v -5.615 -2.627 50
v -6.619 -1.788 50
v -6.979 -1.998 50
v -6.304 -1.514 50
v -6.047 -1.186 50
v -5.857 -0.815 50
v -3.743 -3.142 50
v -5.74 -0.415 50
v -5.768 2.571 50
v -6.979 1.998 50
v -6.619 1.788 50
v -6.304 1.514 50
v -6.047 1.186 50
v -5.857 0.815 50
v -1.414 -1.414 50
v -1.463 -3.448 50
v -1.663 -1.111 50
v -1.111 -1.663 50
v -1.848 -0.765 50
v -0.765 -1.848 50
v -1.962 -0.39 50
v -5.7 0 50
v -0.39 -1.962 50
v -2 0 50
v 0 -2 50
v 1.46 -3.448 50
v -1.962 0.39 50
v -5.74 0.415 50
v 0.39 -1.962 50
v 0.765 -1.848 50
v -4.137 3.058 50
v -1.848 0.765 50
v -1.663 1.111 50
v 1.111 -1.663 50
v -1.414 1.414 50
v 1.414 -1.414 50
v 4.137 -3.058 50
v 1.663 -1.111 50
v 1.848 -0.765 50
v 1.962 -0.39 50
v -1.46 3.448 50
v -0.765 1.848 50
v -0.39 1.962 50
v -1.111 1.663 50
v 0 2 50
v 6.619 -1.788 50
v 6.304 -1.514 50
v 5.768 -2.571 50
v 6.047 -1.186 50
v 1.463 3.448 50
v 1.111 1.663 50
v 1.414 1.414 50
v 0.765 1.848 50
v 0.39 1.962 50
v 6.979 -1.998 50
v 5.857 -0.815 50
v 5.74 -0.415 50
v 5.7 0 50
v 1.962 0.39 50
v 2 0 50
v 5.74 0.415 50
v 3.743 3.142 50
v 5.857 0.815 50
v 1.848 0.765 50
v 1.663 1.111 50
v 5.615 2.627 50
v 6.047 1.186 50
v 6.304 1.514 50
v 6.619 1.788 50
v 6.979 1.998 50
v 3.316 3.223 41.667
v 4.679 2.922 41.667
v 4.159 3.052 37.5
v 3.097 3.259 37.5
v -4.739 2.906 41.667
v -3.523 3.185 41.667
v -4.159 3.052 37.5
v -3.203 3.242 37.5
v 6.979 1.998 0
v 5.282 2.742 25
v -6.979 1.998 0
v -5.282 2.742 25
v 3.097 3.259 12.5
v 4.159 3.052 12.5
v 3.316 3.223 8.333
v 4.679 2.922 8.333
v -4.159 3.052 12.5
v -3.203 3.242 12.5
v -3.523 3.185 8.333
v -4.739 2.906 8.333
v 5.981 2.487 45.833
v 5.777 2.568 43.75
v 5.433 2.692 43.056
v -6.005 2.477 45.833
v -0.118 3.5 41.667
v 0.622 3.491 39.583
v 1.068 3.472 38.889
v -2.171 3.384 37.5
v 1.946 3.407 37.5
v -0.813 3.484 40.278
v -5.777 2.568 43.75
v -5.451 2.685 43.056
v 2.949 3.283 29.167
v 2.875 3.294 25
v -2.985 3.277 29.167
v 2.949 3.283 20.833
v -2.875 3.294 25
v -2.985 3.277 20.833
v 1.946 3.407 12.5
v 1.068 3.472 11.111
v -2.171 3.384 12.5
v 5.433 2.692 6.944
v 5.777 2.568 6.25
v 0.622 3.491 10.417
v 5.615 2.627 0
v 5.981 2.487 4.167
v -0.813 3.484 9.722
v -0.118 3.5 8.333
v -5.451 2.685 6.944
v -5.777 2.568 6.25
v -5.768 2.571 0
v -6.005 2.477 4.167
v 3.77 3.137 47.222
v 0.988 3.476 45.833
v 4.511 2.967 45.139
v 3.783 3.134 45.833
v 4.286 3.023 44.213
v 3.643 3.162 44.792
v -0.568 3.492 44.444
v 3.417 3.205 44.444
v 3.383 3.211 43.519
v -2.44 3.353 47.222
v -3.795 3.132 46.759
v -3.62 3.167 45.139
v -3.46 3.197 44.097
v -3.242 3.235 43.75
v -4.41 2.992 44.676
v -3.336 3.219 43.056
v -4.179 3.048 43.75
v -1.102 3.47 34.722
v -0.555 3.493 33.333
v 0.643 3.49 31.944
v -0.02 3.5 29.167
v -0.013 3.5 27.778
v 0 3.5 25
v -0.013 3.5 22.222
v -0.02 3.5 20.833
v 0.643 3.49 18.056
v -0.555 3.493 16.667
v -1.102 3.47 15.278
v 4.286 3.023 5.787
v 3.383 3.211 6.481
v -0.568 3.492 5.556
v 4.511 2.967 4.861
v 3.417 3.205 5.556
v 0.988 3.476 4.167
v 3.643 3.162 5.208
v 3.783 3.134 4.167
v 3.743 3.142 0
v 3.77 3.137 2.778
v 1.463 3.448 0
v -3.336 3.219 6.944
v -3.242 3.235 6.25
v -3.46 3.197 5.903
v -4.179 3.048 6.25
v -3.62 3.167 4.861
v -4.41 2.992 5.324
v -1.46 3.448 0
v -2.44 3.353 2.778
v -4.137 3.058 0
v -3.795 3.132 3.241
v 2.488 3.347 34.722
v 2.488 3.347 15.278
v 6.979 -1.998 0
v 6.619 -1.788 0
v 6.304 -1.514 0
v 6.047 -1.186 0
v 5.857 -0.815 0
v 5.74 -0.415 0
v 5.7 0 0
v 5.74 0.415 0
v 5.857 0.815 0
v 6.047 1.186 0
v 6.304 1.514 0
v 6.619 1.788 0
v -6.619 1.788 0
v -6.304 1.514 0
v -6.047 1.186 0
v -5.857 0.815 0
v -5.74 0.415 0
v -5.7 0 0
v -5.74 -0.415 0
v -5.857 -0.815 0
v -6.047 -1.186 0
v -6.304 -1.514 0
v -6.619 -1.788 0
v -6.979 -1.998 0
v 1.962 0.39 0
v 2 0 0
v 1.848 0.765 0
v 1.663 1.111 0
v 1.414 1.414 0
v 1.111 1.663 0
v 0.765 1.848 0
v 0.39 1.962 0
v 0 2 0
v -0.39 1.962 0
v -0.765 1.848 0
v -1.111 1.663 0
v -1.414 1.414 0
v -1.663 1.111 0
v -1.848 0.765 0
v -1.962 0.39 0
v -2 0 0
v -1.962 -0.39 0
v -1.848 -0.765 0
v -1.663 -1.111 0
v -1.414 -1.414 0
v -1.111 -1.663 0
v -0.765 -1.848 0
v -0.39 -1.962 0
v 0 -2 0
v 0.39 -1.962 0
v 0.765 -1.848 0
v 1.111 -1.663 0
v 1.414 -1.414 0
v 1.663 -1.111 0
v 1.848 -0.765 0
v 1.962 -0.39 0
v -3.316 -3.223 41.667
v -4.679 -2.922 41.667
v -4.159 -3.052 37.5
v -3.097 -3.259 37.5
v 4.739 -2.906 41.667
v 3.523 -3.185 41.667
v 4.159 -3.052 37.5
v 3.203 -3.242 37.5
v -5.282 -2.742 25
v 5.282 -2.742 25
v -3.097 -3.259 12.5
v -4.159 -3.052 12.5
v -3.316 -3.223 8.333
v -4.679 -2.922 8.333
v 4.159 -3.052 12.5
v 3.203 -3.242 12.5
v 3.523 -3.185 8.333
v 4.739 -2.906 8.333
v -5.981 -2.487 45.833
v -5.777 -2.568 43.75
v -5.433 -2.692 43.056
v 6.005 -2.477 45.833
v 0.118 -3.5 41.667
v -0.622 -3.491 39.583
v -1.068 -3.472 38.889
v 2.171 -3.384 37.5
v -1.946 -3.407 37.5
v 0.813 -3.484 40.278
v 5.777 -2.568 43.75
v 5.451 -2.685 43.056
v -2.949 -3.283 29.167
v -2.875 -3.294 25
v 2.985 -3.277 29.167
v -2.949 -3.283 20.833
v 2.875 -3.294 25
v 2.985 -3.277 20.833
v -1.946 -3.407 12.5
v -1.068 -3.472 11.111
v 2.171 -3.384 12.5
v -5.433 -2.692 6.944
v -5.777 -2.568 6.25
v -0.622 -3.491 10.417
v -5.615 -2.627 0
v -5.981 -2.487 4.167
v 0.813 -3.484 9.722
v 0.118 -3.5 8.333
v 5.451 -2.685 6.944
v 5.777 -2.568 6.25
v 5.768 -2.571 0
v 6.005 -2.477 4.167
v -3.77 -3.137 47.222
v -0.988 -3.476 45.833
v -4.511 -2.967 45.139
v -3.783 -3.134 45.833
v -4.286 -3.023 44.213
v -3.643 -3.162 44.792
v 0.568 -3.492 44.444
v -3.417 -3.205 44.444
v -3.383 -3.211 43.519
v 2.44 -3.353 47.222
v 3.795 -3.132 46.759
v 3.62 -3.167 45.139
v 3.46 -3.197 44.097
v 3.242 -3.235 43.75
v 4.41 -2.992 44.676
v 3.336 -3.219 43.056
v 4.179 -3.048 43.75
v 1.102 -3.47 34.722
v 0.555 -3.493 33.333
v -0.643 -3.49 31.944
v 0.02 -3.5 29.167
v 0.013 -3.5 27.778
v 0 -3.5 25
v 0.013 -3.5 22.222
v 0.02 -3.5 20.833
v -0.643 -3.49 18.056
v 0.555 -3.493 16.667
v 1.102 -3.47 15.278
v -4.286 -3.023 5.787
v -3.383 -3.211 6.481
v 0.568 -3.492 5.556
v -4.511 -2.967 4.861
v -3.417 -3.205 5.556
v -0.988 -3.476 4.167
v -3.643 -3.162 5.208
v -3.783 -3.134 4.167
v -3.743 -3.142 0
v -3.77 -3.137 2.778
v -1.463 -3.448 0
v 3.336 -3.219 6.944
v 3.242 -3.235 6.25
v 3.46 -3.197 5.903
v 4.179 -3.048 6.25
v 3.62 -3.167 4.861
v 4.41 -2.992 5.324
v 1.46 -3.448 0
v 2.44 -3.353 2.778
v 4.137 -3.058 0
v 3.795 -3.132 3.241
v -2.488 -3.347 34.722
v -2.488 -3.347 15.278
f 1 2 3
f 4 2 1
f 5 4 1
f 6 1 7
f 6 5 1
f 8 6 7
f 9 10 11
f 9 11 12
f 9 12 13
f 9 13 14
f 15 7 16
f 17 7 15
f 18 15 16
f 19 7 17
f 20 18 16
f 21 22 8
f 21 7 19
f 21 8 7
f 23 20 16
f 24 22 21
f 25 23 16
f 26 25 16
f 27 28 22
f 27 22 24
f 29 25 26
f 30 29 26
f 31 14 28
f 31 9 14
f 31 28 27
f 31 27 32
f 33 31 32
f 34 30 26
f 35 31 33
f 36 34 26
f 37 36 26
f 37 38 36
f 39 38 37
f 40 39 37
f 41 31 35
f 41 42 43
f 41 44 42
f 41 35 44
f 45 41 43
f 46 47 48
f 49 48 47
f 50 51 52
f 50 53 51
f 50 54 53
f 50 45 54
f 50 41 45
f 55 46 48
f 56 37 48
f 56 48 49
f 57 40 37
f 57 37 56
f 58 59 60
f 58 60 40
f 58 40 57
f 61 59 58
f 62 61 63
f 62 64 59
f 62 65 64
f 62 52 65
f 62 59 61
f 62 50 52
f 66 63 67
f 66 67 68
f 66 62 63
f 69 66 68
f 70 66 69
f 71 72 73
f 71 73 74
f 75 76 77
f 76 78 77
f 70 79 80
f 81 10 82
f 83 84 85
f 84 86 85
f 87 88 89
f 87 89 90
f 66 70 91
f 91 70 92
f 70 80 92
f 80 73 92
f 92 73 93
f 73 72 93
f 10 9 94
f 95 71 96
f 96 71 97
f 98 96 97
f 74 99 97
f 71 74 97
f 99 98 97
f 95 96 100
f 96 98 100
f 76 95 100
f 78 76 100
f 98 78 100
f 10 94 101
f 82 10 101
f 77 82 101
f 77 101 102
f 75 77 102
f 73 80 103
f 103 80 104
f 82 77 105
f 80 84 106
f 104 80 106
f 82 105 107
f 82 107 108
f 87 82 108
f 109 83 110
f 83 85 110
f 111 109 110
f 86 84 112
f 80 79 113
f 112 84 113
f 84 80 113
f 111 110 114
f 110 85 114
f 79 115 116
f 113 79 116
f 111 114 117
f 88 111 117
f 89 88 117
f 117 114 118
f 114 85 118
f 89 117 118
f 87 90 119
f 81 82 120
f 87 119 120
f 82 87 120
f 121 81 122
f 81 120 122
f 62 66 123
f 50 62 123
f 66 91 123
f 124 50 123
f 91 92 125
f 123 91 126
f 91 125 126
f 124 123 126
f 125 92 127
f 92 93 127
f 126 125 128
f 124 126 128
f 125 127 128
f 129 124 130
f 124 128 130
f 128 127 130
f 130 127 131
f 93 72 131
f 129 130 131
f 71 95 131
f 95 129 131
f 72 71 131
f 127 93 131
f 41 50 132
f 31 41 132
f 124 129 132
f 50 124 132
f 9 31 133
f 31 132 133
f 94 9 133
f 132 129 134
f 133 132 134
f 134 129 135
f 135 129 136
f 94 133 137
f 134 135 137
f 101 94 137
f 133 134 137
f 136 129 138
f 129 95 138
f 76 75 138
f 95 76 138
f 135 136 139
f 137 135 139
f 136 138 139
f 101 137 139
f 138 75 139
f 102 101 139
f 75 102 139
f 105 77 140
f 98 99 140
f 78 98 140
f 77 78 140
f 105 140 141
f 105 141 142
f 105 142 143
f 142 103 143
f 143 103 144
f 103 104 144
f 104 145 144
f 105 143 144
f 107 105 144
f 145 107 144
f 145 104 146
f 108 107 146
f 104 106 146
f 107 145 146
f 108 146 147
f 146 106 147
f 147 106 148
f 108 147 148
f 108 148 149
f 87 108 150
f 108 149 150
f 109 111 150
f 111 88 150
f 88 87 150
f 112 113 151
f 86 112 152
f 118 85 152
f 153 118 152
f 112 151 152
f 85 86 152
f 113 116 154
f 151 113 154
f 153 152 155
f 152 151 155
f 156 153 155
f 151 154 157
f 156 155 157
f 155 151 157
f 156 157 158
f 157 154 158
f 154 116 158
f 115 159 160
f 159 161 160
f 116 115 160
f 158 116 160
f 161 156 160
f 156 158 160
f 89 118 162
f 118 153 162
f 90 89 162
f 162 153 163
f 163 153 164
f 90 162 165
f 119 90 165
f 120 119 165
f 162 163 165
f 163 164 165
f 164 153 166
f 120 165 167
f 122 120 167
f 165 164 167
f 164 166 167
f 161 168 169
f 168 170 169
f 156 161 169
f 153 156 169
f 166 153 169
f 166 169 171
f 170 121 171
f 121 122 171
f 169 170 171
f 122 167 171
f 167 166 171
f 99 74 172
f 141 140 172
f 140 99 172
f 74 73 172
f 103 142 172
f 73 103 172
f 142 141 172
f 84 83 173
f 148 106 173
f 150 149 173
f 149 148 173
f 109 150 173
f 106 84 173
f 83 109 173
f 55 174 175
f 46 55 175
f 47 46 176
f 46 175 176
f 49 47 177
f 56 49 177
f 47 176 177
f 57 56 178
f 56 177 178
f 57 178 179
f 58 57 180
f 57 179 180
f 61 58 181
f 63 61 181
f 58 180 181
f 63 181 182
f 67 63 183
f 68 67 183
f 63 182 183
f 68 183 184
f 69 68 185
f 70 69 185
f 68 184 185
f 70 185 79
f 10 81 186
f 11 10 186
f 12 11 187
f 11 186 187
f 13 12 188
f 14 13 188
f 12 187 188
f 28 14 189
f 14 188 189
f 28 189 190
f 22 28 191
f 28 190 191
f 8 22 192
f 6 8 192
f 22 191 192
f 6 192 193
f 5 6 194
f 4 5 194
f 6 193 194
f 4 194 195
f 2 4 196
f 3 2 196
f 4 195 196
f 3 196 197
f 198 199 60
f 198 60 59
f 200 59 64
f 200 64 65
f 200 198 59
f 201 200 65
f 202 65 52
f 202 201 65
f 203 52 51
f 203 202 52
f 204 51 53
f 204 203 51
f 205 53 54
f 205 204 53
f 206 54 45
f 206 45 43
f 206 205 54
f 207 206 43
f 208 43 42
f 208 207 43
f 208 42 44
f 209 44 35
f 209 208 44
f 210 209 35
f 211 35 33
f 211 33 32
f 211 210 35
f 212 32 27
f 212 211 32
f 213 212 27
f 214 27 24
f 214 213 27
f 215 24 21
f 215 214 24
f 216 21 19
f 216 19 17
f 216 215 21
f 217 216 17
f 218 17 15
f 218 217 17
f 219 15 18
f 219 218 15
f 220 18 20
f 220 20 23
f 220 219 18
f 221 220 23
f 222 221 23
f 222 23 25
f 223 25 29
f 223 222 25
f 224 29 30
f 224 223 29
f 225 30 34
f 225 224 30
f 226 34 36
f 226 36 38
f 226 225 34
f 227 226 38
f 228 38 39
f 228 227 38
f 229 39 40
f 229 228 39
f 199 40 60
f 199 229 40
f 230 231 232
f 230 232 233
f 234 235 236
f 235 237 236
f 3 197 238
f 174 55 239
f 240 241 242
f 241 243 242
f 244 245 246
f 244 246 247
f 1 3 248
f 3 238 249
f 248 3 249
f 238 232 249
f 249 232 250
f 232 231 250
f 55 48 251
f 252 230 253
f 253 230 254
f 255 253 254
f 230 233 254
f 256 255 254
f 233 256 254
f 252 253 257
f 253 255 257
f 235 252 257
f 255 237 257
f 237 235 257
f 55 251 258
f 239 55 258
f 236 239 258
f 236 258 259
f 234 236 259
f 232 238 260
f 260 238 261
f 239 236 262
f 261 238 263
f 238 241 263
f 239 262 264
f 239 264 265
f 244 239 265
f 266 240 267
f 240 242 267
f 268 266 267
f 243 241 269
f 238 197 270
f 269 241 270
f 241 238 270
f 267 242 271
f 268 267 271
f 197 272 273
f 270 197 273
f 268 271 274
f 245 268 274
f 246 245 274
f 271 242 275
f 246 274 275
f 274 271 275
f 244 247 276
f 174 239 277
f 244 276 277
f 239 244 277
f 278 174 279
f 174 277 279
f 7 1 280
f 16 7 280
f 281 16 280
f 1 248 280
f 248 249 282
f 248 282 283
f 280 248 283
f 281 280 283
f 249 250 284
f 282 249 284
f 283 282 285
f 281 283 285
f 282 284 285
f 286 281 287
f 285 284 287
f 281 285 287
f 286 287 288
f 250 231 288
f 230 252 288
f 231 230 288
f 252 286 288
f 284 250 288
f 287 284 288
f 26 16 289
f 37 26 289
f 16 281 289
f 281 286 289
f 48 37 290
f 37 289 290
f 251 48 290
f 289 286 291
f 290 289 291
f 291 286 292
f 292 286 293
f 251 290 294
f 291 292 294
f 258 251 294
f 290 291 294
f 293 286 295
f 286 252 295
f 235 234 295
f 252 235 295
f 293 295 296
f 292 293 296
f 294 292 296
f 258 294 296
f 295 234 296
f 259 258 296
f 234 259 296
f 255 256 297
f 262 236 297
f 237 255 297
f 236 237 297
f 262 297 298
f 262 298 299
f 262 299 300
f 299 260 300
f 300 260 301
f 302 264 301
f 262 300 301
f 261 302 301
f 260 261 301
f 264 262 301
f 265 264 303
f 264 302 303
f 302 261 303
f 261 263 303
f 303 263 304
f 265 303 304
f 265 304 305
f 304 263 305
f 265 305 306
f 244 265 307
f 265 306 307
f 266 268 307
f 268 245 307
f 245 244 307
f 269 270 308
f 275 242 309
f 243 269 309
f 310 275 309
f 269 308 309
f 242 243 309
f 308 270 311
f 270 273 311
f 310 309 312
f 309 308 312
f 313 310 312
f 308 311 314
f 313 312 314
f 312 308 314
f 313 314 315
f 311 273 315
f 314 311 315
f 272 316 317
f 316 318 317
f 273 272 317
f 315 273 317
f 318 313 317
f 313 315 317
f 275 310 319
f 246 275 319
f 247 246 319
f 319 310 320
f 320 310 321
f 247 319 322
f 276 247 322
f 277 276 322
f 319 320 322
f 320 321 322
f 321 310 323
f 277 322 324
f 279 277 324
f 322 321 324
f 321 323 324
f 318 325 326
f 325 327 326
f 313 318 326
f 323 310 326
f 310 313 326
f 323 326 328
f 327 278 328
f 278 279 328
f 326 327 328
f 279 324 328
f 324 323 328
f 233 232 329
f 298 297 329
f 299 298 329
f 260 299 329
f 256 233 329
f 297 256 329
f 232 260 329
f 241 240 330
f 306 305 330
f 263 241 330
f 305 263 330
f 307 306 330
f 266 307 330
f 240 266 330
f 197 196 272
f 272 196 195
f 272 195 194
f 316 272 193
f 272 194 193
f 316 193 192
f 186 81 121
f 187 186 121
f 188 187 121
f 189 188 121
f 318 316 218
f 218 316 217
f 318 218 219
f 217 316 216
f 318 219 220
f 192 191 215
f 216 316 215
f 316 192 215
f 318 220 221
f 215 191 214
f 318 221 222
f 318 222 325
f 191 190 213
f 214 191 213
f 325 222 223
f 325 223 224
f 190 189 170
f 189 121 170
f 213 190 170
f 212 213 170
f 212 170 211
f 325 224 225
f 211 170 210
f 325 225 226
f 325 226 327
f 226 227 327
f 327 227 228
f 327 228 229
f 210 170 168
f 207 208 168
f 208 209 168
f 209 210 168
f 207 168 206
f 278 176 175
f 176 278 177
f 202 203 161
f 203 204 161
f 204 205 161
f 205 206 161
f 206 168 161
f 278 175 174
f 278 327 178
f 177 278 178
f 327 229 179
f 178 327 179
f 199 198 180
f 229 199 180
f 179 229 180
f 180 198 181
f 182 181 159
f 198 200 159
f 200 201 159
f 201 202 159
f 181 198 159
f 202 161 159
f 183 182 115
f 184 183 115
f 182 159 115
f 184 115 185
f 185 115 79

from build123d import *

# Parameters (mm, degrees)
F0_R     = 2
F1_DEPTH = 50


with BuildPart() as f1:
    # F0 (on Top) → F1 (new body)
    with BuildSketch(Plane.XY):
        with BuildLine():
            ThreePointArc((-6.9790131878, 1.9979447669), (-5.7, 0), (-6.9790131878, -1.9979447669))
            add(Edge.make_bspline(
                [(-6.9790131878, -1.9979447669), (0, -6.1313006259), (6.9790131878, -1.9979447669)],
                knots=[0.6075302167, 0.6075302167, 0.6075302167, 2.5340624369, 2.5340624369, 2.5340624369], degree=2, weights=[1, 0.570841362, 1]))
            ThreePointArc((6.9790131878, -1.9979447669), (5.7, 0), (6.9790131878, 1.9979447669))
            add(Edge.make_bspline(
                [(6.9790131878, 1.9979447669), (0, 6.1313006259), (-6.9790131878, 1.9979447669)],
                knots=[3.7491228703, 3.7491228703, 3.7491228703, 5.6756550905, 5.6756550905, 5.6756550905], degree=2, weights=[1, 0.570841362, 1]))
        make_face()
        Circle(F0_R, mode=Mode.SUBTRACT)
    extrude(amount=F1_DEPTH)


solid = f1.part
